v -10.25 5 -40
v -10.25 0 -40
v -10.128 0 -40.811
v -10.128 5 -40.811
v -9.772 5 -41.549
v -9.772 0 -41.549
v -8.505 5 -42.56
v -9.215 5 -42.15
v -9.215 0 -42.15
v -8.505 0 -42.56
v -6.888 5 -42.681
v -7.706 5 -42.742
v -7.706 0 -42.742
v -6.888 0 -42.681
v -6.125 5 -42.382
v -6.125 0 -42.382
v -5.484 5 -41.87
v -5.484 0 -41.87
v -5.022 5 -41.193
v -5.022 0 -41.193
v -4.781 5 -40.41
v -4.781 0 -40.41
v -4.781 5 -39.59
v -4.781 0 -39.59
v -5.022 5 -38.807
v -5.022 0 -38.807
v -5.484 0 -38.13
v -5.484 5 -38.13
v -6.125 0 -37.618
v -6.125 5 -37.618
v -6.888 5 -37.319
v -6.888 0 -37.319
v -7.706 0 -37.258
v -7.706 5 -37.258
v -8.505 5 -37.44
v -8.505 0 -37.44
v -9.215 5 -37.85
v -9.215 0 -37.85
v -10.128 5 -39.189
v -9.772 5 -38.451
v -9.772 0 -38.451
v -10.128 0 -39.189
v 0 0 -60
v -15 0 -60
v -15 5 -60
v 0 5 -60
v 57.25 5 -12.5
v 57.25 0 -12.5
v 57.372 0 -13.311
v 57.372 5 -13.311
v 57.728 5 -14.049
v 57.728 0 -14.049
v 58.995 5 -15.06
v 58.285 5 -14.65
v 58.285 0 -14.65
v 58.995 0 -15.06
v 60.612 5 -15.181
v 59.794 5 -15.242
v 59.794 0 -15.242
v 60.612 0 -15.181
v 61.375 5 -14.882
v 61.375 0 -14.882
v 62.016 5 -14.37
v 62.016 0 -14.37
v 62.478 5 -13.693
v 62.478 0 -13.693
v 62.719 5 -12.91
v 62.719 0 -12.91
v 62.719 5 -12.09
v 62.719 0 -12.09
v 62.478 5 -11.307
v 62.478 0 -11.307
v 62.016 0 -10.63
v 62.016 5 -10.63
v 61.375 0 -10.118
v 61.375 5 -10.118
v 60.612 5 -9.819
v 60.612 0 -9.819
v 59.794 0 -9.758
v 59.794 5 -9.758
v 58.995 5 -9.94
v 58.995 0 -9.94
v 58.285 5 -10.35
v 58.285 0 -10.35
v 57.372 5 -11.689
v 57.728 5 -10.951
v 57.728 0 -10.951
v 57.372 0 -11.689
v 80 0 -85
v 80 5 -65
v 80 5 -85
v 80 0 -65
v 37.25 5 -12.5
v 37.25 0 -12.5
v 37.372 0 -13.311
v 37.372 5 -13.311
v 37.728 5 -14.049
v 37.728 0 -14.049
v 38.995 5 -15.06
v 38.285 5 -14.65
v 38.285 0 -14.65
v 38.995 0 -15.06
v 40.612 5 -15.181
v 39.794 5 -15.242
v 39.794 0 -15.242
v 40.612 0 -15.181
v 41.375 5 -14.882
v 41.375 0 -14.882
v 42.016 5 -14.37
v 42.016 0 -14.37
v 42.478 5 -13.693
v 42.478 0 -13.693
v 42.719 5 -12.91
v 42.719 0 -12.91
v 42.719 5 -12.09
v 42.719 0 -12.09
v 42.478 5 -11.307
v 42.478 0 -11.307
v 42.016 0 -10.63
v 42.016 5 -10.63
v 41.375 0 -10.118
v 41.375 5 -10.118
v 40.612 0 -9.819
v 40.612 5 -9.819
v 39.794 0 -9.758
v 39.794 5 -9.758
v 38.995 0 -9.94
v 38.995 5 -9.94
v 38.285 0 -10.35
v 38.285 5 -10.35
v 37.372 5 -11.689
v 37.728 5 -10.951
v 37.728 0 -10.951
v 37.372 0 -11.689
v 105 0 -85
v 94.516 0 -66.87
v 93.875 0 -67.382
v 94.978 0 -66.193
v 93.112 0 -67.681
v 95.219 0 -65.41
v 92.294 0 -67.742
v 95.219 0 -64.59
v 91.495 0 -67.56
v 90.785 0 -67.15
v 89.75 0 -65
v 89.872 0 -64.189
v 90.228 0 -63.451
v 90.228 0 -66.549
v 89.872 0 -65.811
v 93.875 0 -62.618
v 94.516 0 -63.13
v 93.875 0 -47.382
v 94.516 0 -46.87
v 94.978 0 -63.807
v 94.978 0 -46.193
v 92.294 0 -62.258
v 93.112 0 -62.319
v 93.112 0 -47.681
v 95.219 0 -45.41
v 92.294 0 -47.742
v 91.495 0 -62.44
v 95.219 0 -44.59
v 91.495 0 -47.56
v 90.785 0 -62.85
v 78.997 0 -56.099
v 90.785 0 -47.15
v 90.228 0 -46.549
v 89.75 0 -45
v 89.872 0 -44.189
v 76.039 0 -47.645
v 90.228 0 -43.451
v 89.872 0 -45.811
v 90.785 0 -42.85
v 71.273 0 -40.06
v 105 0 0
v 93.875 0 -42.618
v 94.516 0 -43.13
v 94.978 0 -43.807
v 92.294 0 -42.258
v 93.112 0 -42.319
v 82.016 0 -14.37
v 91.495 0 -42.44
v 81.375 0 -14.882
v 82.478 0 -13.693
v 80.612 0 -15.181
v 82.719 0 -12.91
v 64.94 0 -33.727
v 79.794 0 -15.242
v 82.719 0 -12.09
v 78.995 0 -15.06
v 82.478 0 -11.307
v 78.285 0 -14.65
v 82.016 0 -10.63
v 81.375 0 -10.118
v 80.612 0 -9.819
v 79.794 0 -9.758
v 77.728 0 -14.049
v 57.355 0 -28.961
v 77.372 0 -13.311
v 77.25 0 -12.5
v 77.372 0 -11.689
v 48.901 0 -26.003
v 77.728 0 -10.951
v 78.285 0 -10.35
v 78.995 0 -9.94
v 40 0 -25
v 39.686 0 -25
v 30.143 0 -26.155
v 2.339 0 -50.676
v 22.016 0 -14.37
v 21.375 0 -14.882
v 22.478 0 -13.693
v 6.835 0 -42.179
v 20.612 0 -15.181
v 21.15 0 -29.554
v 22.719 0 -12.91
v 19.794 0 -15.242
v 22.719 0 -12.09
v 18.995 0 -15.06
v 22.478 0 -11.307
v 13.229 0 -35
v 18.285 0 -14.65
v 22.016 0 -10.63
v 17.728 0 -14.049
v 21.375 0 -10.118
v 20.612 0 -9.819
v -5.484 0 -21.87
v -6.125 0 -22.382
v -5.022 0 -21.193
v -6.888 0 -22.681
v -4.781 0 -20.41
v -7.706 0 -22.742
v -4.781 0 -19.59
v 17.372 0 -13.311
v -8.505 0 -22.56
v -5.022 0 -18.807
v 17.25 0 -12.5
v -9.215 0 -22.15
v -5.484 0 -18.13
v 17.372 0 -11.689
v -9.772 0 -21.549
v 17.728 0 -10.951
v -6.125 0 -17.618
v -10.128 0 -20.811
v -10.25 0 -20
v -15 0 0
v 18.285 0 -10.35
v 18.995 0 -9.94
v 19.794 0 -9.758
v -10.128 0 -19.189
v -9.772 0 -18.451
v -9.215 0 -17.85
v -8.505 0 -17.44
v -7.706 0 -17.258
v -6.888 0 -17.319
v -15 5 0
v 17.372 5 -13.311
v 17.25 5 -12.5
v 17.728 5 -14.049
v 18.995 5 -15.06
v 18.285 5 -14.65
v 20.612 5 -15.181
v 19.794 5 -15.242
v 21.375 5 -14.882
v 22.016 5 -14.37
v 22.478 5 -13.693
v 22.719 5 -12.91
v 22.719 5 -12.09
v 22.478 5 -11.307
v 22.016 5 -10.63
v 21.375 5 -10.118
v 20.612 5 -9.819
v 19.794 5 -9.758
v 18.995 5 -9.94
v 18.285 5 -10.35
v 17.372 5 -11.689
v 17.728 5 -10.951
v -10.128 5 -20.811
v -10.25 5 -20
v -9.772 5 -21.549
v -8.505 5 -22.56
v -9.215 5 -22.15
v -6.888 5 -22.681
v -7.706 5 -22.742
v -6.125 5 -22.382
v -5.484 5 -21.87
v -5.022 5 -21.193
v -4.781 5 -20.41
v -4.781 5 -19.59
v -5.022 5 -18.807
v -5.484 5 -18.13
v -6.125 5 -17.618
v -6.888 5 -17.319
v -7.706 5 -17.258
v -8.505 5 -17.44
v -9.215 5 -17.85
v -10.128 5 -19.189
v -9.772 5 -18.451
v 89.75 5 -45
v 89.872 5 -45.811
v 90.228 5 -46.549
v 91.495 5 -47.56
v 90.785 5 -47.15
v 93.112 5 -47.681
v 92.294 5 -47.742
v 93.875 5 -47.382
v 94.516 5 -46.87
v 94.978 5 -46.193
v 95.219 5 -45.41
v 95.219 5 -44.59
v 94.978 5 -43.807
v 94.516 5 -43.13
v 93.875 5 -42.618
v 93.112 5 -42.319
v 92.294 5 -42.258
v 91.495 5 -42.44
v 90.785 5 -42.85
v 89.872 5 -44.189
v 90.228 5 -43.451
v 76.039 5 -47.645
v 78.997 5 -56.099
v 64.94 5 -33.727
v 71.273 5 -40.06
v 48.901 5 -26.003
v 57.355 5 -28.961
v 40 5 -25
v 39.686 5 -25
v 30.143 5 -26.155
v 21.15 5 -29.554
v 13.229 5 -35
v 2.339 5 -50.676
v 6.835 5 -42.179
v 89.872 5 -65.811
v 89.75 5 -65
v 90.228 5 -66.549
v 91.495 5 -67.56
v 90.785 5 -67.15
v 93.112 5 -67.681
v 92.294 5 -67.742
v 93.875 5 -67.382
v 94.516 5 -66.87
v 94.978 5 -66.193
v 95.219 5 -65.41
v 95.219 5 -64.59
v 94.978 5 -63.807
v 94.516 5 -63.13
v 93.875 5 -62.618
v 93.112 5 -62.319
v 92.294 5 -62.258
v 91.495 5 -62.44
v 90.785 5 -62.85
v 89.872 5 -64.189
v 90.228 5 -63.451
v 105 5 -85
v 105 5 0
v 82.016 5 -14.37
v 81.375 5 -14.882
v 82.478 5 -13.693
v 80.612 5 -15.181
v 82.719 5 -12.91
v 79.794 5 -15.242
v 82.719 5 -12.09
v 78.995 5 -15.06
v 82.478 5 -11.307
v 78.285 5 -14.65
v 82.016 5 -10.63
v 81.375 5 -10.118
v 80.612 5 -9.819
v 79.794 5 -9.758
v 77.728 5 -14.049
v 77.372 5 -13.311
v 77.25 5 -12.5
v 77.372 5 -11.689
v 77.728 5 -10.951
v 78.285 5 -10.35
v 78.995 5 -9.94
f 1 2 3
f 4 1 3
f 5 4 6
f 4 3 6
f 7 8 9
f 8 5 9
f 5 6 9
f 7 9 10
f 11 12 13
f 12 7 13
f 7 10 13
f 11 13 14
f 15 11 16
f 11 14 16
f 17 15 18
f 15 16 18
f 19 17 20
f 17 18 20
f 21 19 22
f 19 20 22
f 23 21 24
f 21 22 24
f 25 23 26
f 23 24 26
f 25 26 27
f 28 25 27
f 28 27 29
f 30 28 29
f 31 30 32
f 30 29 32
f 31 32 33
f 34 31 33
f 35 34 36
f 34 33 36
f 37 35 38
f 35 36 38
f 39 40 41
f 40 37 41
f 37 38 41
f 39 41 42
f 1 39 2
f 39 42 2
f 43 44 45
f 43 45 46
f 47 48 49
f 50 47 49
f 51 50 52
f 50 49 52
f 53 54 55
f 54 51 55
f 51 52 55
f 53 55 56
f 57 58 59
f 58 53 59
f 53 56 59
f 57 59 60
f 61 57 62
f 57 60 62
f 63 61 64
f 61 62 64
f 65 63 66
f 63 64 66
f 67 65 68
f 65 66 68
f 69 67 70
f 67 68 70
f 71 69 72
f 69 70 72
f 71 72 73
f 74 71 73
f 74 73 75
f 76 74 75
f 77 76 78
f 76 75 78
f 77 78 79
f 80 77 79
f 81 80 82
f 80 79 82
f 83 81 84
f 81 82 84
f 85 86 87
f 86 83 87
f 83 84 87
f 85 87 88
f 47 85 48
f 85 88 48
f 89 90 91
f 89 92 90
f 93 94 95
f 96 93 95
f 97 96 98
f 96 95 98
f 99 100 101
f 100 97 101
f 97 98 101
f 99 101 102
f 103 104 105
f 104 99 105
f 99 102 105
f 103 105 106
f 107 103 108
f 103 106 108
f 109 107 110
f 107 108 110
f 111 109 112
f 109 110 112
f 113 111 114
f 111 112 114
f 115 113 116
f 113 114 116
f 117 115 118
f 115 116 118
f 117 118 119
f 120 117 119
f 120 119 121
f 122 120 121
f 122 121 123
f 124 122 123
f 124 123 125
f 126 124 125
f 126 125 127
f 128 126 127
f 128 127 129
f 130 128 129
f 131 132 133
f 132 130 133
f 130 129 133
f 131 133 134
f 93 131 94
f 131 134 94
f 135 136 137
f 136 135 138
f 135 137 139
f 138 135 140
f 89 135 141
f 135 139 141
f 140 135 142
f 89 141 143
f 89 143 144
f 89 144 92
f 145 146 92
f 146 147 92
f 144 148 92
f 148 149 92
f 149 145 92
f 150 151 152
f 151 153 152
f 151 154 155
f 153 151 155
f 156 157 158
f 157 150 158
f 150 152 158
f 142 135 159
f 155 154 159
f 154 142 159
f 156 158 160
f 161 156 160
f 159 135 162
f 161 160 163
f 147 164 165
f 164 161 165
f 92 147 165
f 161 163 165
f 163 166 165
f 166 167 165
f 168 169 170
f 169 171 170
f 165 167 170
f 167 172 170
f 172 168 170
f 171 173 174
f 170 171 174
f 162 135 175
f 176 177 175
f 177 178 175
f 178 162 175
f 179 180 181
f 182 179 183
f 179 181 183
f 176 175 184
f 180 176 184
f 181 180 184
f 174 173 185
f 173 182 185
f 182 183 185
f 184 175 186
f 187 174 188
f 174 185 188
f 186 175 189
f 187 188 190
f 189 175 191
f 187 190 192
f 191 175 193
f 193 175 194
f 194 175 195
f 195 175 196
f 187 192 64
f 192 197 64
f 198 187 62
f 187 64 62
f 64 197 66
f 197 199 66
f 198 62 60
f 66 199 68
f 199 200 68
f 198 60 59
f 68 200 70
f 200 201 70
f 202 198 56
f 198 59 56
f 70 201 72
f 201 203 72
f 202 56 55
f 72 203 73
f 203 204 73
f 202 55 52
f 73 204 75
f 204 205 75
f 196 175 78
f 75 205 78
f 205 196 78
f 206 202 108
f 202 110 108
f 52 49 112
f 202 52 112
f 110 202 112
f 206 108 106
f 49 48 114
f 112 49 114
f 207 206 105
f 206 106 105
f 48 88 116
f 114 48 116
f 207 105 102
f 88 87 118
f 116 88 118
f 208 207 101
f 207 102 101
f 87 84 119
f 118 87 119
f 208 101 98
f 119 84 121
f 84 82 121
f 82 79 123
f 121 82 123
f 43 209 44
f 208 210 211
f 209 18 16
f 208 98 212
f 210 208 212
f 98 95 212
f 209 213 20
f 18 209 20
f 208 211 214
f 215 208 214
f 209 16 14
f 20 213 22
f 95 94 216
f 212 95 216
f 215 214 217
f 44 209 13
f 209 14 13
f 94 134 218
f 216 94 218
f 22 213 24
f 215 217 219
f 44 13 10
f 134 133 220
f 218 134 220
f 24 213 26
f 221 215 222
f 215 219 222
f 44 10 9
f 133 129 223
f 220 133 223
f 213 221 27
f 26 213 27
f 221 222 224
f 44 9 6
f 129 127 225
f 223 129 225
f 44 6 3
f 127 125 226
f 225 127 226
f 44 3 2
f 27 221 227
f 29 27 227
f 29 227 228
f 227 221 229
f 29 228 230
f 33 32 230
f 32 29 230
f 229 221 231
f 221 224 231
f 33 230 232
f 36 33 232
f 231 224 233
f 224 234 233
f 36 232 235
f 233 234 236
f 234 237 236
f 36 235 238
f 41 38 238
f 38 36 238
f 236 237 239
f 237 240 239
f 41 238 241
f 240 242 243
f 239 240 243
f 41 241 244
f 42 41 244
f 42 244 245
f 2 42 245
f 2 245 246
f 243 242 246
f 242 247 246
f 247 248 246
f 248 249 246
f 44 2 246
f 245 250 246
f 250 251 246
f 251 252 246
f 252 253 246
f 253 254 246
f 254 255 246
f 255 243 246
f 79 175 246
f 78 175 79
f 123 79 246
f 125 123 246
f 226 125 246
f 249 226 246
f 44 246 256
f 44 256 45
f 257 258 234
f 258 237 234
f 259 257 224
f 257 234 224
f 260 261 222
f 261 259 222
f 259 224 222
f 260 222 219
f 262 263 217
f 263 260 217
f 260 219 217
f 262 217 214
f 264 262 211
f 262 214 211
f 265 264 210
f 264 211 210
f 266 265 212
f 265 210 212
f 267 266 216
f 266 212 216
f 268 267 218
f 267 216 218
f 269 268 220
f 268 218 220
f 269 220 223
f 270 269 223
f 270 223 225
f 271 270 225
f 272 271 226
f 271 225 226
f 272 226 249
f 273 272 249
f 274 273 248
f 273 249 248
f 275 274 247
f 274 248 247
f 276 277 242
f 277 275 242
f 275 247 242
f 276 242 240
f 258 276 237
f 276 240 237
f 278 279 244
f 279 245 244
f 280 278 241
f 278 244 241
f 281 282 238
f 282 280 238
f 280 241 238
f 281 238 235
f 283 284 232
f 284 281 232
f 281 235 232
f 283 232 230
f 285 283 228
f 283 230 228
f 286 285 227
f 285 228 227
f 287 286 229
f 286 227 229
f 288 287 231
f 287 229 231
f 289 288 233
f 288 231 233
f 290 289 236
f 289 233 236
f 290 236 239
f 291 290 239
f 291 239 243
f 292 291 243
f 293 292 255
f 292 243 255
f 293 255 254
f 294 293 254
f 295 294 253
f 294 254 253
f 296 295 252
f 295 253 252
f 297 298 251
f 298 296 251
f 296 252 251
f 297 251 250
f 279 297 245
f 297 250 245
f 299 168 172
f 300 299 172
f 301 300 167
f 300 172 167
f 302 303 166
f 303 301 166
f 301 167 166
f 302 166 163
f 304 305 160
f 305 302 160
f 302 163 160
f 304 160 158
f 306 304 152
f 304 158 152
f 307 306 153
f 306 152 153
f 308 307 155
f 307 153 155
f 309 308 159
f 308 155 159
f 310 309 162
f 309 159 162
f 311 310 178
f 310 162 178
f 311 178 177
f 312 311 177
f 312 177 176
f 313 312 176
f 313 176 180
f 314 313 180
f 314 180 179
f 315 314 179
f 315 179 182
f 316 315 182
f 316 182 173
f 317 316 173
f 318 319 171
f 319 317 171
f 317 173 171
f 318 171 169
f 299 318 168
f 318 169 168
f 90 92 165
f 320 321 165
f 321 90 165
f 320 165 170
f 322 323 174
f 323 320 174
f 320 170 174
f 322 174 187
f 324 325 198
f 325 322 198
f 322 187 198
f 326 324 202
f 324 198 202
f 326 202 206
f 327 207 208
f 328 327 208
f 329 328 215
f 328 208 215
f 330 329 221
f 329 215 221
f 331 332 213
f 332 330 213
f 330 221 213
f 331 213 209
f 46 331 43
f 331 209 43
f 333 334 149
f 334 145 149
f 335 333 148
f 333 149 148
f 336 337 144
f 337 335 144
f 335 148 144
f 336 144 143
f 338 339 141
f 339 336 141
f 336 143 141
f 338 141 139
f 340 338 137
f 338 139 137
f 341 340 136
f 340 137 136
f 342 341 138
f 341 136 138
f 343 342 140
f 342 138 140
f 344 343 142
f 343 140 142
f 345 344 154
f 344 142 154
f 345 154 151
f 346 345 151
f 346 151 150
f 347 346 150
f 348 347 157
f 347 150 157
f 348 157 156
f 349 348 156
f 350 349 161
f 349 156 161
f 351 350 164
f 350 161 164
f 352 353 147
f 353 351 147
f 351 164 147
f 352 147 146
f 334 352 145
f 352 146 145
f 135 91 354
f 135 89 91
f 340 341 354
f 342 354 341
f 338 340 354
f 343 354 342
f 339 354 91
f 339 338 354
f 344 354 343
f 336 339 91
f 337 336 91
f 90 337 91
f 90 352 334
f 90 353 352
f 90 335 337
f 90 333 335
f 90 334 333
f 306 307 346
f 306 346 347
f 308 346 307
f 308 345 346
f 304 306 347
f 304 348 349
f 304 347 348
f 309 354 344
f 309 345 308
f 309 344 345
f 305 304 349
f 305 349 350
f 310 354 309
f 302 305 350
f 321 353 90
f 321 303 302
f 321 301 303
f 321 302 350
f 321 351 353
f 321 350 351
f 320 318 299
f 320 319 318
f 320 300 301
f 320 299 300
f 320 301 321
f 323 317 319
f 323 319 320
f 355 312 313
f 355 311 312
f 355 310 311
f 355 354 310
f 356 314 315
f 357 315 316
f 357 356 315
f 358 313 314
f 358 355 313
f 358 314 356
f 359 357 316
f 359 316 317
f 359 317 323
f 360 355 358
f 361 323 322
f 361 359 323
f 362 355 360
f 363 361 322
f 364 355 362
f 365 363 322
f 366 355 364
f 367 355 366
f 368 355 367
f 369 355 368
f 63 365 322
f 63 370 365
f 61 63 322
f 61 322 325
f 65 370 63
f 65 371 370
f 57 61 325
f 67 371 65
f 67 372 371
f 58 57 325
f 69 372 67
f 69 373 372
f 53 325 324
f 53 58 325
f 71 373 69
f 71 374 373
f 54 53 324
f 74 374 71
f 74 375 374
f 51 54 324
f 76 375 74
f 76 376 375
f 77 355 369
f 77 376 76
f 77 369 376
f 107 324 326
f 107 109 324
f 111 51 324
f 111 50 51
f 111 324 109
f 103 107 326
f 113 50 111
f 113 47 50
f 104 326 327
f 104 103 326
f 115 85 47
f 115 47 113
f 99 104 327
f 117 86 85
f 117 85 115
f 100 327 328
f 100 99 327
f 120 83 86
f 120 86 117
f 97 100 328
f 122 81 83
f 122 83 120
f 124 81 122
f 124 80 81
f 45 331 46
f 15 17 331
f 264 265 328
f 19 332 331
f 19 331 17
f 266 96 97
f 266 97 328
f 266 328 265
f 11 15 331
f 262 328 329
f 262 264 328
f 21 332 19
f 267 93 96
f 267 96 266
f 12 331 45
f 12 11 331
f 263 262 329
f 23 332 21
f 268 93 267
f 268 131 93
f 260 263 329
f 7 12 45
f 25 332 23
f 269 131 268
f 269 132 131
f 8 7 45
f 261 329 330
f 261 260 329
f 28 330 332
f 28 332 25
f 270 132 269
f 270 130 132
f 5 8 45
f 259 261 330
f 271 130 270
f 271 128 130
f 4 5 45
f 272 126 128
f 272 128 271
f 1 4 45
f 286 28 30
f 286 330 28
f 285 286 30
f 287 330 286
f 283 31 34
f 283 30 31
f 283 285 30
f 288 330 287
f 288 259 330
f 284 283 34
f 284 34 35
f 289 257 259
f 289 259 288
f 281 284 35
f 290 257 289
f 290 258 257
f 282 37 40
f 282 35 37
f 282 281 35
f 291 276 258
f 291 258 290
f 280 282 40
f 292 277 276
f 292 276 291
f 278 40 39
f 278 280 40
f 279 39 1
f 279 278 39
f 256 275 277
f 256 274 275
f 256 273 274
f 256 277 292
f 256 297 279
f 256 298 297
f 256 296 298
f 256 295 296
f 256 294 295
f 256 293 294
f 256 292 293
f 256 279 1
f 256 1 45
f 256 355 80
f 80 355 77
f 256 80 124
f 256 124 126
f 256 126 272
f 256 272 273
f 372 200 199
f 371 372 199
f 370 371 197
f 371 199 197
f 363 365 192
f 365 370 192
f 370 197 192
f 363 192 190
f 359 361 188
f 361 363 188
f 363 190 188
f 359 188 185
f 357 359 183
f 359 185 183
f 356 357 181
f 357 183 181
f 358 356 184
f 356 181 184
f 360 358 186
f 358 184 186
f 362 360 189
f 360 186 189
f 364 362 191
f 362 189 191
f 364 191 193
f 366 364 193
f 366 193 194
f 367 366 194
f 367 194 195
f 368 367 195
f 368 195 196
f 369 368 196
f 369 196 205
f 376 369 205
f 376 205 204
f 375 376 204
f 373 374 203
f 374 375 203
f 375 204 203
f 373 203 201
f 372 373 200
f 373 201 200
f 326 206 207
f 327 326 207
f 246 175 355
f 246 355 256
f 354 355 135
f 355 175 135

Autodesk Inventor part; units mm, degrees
ref_plane "YZ Plane" through (0, 0, 0) normal (1, 0, 0) x (0, 1, 0)
ref_plane "XZ Plane" through (0, 0, 0) normal (0, 1, 0) x (-1, 0, 0)
ref_plane "XY Plane" through (0, 0, 0) normal (0, 0, 1) x (1, 0, 0)
sketch "Sketch1" plane through (0, 0, 0) normal (0, 1, 0) x (-1, 0, 0)
  line L0 (0, 0) -> (15, 0)
  line L1 (15, 0) -> (15, -60)
  line L2 (15, -60) -> (0, -60)
  line L3 (0, -60) -> (0, 0)
  circle A0 centre (7.5, -40) radius 2.75
  line L4 (0, 0) -> (-105, 0)
  line L5 (-105, 0) -> (-105, -25)
  line L6 (-105, -25) -> (0, -25)
  line L7 (0, -25) -> (0, 0)
  line L8 (-105, -25) -> (-80, -25)
  line L9 (-80, -25) -> (-80, -85)
  line L10 (-80, -85) -> (-105, -85)
  line L11 (-105, -85) -> (-105, -25)
  circle A1 centre (7.5, -20) radius 2.75
  circle A2 centre (-20, -12.5) radius 2.75
  circle A3 centre (-40, -12.5) radius 2.75
  circle A4 centre (-60, -12.5) radius 2.75
  circle A5 centre (-80, -12.5) radius 2.75
  circle A6 centre (-92.5, -45) radius 2.75
  circle A7 centre (-92.5, -65) radius 2.75
  line L12 (-30, -25) -> (-30, 0)
  dimension "d0" = 15
  dimension "d1" = 60
  dimension "d2" = 5.5
  dimension "d3" = 40
  dimension "d4" = 7.5
  dimension "d5" = 105
  dimension "d6" = 25
  dimension "d7" = 60
  dimension "d8" = 25
  dimension "d9" = 5.5
  dimension "d10" = 7.5
  dimension "d11" = 20
  dimension "d12" = 5.5
  dimension "d13" = 12.5
  dimension "d14" = 20
  dimension "d17" = 20
  dimension "d22" = 5.5
  dimension "d23" = 5.5
  dimension "d24" = 12.5
  dimension "d25" = 12.5
  dimension "d26" = 20
  dimension "d27" = 20
  dimension "d31" = 10
extrude "Extrusion1" add sketch "Sketch1" along normal blind 5
fillet "Fillet1" radius 40 2 edges at (80, 2.5, -25) (0, 2.5, -25)
properties part number "Brace" material "Aluminum 6061"
